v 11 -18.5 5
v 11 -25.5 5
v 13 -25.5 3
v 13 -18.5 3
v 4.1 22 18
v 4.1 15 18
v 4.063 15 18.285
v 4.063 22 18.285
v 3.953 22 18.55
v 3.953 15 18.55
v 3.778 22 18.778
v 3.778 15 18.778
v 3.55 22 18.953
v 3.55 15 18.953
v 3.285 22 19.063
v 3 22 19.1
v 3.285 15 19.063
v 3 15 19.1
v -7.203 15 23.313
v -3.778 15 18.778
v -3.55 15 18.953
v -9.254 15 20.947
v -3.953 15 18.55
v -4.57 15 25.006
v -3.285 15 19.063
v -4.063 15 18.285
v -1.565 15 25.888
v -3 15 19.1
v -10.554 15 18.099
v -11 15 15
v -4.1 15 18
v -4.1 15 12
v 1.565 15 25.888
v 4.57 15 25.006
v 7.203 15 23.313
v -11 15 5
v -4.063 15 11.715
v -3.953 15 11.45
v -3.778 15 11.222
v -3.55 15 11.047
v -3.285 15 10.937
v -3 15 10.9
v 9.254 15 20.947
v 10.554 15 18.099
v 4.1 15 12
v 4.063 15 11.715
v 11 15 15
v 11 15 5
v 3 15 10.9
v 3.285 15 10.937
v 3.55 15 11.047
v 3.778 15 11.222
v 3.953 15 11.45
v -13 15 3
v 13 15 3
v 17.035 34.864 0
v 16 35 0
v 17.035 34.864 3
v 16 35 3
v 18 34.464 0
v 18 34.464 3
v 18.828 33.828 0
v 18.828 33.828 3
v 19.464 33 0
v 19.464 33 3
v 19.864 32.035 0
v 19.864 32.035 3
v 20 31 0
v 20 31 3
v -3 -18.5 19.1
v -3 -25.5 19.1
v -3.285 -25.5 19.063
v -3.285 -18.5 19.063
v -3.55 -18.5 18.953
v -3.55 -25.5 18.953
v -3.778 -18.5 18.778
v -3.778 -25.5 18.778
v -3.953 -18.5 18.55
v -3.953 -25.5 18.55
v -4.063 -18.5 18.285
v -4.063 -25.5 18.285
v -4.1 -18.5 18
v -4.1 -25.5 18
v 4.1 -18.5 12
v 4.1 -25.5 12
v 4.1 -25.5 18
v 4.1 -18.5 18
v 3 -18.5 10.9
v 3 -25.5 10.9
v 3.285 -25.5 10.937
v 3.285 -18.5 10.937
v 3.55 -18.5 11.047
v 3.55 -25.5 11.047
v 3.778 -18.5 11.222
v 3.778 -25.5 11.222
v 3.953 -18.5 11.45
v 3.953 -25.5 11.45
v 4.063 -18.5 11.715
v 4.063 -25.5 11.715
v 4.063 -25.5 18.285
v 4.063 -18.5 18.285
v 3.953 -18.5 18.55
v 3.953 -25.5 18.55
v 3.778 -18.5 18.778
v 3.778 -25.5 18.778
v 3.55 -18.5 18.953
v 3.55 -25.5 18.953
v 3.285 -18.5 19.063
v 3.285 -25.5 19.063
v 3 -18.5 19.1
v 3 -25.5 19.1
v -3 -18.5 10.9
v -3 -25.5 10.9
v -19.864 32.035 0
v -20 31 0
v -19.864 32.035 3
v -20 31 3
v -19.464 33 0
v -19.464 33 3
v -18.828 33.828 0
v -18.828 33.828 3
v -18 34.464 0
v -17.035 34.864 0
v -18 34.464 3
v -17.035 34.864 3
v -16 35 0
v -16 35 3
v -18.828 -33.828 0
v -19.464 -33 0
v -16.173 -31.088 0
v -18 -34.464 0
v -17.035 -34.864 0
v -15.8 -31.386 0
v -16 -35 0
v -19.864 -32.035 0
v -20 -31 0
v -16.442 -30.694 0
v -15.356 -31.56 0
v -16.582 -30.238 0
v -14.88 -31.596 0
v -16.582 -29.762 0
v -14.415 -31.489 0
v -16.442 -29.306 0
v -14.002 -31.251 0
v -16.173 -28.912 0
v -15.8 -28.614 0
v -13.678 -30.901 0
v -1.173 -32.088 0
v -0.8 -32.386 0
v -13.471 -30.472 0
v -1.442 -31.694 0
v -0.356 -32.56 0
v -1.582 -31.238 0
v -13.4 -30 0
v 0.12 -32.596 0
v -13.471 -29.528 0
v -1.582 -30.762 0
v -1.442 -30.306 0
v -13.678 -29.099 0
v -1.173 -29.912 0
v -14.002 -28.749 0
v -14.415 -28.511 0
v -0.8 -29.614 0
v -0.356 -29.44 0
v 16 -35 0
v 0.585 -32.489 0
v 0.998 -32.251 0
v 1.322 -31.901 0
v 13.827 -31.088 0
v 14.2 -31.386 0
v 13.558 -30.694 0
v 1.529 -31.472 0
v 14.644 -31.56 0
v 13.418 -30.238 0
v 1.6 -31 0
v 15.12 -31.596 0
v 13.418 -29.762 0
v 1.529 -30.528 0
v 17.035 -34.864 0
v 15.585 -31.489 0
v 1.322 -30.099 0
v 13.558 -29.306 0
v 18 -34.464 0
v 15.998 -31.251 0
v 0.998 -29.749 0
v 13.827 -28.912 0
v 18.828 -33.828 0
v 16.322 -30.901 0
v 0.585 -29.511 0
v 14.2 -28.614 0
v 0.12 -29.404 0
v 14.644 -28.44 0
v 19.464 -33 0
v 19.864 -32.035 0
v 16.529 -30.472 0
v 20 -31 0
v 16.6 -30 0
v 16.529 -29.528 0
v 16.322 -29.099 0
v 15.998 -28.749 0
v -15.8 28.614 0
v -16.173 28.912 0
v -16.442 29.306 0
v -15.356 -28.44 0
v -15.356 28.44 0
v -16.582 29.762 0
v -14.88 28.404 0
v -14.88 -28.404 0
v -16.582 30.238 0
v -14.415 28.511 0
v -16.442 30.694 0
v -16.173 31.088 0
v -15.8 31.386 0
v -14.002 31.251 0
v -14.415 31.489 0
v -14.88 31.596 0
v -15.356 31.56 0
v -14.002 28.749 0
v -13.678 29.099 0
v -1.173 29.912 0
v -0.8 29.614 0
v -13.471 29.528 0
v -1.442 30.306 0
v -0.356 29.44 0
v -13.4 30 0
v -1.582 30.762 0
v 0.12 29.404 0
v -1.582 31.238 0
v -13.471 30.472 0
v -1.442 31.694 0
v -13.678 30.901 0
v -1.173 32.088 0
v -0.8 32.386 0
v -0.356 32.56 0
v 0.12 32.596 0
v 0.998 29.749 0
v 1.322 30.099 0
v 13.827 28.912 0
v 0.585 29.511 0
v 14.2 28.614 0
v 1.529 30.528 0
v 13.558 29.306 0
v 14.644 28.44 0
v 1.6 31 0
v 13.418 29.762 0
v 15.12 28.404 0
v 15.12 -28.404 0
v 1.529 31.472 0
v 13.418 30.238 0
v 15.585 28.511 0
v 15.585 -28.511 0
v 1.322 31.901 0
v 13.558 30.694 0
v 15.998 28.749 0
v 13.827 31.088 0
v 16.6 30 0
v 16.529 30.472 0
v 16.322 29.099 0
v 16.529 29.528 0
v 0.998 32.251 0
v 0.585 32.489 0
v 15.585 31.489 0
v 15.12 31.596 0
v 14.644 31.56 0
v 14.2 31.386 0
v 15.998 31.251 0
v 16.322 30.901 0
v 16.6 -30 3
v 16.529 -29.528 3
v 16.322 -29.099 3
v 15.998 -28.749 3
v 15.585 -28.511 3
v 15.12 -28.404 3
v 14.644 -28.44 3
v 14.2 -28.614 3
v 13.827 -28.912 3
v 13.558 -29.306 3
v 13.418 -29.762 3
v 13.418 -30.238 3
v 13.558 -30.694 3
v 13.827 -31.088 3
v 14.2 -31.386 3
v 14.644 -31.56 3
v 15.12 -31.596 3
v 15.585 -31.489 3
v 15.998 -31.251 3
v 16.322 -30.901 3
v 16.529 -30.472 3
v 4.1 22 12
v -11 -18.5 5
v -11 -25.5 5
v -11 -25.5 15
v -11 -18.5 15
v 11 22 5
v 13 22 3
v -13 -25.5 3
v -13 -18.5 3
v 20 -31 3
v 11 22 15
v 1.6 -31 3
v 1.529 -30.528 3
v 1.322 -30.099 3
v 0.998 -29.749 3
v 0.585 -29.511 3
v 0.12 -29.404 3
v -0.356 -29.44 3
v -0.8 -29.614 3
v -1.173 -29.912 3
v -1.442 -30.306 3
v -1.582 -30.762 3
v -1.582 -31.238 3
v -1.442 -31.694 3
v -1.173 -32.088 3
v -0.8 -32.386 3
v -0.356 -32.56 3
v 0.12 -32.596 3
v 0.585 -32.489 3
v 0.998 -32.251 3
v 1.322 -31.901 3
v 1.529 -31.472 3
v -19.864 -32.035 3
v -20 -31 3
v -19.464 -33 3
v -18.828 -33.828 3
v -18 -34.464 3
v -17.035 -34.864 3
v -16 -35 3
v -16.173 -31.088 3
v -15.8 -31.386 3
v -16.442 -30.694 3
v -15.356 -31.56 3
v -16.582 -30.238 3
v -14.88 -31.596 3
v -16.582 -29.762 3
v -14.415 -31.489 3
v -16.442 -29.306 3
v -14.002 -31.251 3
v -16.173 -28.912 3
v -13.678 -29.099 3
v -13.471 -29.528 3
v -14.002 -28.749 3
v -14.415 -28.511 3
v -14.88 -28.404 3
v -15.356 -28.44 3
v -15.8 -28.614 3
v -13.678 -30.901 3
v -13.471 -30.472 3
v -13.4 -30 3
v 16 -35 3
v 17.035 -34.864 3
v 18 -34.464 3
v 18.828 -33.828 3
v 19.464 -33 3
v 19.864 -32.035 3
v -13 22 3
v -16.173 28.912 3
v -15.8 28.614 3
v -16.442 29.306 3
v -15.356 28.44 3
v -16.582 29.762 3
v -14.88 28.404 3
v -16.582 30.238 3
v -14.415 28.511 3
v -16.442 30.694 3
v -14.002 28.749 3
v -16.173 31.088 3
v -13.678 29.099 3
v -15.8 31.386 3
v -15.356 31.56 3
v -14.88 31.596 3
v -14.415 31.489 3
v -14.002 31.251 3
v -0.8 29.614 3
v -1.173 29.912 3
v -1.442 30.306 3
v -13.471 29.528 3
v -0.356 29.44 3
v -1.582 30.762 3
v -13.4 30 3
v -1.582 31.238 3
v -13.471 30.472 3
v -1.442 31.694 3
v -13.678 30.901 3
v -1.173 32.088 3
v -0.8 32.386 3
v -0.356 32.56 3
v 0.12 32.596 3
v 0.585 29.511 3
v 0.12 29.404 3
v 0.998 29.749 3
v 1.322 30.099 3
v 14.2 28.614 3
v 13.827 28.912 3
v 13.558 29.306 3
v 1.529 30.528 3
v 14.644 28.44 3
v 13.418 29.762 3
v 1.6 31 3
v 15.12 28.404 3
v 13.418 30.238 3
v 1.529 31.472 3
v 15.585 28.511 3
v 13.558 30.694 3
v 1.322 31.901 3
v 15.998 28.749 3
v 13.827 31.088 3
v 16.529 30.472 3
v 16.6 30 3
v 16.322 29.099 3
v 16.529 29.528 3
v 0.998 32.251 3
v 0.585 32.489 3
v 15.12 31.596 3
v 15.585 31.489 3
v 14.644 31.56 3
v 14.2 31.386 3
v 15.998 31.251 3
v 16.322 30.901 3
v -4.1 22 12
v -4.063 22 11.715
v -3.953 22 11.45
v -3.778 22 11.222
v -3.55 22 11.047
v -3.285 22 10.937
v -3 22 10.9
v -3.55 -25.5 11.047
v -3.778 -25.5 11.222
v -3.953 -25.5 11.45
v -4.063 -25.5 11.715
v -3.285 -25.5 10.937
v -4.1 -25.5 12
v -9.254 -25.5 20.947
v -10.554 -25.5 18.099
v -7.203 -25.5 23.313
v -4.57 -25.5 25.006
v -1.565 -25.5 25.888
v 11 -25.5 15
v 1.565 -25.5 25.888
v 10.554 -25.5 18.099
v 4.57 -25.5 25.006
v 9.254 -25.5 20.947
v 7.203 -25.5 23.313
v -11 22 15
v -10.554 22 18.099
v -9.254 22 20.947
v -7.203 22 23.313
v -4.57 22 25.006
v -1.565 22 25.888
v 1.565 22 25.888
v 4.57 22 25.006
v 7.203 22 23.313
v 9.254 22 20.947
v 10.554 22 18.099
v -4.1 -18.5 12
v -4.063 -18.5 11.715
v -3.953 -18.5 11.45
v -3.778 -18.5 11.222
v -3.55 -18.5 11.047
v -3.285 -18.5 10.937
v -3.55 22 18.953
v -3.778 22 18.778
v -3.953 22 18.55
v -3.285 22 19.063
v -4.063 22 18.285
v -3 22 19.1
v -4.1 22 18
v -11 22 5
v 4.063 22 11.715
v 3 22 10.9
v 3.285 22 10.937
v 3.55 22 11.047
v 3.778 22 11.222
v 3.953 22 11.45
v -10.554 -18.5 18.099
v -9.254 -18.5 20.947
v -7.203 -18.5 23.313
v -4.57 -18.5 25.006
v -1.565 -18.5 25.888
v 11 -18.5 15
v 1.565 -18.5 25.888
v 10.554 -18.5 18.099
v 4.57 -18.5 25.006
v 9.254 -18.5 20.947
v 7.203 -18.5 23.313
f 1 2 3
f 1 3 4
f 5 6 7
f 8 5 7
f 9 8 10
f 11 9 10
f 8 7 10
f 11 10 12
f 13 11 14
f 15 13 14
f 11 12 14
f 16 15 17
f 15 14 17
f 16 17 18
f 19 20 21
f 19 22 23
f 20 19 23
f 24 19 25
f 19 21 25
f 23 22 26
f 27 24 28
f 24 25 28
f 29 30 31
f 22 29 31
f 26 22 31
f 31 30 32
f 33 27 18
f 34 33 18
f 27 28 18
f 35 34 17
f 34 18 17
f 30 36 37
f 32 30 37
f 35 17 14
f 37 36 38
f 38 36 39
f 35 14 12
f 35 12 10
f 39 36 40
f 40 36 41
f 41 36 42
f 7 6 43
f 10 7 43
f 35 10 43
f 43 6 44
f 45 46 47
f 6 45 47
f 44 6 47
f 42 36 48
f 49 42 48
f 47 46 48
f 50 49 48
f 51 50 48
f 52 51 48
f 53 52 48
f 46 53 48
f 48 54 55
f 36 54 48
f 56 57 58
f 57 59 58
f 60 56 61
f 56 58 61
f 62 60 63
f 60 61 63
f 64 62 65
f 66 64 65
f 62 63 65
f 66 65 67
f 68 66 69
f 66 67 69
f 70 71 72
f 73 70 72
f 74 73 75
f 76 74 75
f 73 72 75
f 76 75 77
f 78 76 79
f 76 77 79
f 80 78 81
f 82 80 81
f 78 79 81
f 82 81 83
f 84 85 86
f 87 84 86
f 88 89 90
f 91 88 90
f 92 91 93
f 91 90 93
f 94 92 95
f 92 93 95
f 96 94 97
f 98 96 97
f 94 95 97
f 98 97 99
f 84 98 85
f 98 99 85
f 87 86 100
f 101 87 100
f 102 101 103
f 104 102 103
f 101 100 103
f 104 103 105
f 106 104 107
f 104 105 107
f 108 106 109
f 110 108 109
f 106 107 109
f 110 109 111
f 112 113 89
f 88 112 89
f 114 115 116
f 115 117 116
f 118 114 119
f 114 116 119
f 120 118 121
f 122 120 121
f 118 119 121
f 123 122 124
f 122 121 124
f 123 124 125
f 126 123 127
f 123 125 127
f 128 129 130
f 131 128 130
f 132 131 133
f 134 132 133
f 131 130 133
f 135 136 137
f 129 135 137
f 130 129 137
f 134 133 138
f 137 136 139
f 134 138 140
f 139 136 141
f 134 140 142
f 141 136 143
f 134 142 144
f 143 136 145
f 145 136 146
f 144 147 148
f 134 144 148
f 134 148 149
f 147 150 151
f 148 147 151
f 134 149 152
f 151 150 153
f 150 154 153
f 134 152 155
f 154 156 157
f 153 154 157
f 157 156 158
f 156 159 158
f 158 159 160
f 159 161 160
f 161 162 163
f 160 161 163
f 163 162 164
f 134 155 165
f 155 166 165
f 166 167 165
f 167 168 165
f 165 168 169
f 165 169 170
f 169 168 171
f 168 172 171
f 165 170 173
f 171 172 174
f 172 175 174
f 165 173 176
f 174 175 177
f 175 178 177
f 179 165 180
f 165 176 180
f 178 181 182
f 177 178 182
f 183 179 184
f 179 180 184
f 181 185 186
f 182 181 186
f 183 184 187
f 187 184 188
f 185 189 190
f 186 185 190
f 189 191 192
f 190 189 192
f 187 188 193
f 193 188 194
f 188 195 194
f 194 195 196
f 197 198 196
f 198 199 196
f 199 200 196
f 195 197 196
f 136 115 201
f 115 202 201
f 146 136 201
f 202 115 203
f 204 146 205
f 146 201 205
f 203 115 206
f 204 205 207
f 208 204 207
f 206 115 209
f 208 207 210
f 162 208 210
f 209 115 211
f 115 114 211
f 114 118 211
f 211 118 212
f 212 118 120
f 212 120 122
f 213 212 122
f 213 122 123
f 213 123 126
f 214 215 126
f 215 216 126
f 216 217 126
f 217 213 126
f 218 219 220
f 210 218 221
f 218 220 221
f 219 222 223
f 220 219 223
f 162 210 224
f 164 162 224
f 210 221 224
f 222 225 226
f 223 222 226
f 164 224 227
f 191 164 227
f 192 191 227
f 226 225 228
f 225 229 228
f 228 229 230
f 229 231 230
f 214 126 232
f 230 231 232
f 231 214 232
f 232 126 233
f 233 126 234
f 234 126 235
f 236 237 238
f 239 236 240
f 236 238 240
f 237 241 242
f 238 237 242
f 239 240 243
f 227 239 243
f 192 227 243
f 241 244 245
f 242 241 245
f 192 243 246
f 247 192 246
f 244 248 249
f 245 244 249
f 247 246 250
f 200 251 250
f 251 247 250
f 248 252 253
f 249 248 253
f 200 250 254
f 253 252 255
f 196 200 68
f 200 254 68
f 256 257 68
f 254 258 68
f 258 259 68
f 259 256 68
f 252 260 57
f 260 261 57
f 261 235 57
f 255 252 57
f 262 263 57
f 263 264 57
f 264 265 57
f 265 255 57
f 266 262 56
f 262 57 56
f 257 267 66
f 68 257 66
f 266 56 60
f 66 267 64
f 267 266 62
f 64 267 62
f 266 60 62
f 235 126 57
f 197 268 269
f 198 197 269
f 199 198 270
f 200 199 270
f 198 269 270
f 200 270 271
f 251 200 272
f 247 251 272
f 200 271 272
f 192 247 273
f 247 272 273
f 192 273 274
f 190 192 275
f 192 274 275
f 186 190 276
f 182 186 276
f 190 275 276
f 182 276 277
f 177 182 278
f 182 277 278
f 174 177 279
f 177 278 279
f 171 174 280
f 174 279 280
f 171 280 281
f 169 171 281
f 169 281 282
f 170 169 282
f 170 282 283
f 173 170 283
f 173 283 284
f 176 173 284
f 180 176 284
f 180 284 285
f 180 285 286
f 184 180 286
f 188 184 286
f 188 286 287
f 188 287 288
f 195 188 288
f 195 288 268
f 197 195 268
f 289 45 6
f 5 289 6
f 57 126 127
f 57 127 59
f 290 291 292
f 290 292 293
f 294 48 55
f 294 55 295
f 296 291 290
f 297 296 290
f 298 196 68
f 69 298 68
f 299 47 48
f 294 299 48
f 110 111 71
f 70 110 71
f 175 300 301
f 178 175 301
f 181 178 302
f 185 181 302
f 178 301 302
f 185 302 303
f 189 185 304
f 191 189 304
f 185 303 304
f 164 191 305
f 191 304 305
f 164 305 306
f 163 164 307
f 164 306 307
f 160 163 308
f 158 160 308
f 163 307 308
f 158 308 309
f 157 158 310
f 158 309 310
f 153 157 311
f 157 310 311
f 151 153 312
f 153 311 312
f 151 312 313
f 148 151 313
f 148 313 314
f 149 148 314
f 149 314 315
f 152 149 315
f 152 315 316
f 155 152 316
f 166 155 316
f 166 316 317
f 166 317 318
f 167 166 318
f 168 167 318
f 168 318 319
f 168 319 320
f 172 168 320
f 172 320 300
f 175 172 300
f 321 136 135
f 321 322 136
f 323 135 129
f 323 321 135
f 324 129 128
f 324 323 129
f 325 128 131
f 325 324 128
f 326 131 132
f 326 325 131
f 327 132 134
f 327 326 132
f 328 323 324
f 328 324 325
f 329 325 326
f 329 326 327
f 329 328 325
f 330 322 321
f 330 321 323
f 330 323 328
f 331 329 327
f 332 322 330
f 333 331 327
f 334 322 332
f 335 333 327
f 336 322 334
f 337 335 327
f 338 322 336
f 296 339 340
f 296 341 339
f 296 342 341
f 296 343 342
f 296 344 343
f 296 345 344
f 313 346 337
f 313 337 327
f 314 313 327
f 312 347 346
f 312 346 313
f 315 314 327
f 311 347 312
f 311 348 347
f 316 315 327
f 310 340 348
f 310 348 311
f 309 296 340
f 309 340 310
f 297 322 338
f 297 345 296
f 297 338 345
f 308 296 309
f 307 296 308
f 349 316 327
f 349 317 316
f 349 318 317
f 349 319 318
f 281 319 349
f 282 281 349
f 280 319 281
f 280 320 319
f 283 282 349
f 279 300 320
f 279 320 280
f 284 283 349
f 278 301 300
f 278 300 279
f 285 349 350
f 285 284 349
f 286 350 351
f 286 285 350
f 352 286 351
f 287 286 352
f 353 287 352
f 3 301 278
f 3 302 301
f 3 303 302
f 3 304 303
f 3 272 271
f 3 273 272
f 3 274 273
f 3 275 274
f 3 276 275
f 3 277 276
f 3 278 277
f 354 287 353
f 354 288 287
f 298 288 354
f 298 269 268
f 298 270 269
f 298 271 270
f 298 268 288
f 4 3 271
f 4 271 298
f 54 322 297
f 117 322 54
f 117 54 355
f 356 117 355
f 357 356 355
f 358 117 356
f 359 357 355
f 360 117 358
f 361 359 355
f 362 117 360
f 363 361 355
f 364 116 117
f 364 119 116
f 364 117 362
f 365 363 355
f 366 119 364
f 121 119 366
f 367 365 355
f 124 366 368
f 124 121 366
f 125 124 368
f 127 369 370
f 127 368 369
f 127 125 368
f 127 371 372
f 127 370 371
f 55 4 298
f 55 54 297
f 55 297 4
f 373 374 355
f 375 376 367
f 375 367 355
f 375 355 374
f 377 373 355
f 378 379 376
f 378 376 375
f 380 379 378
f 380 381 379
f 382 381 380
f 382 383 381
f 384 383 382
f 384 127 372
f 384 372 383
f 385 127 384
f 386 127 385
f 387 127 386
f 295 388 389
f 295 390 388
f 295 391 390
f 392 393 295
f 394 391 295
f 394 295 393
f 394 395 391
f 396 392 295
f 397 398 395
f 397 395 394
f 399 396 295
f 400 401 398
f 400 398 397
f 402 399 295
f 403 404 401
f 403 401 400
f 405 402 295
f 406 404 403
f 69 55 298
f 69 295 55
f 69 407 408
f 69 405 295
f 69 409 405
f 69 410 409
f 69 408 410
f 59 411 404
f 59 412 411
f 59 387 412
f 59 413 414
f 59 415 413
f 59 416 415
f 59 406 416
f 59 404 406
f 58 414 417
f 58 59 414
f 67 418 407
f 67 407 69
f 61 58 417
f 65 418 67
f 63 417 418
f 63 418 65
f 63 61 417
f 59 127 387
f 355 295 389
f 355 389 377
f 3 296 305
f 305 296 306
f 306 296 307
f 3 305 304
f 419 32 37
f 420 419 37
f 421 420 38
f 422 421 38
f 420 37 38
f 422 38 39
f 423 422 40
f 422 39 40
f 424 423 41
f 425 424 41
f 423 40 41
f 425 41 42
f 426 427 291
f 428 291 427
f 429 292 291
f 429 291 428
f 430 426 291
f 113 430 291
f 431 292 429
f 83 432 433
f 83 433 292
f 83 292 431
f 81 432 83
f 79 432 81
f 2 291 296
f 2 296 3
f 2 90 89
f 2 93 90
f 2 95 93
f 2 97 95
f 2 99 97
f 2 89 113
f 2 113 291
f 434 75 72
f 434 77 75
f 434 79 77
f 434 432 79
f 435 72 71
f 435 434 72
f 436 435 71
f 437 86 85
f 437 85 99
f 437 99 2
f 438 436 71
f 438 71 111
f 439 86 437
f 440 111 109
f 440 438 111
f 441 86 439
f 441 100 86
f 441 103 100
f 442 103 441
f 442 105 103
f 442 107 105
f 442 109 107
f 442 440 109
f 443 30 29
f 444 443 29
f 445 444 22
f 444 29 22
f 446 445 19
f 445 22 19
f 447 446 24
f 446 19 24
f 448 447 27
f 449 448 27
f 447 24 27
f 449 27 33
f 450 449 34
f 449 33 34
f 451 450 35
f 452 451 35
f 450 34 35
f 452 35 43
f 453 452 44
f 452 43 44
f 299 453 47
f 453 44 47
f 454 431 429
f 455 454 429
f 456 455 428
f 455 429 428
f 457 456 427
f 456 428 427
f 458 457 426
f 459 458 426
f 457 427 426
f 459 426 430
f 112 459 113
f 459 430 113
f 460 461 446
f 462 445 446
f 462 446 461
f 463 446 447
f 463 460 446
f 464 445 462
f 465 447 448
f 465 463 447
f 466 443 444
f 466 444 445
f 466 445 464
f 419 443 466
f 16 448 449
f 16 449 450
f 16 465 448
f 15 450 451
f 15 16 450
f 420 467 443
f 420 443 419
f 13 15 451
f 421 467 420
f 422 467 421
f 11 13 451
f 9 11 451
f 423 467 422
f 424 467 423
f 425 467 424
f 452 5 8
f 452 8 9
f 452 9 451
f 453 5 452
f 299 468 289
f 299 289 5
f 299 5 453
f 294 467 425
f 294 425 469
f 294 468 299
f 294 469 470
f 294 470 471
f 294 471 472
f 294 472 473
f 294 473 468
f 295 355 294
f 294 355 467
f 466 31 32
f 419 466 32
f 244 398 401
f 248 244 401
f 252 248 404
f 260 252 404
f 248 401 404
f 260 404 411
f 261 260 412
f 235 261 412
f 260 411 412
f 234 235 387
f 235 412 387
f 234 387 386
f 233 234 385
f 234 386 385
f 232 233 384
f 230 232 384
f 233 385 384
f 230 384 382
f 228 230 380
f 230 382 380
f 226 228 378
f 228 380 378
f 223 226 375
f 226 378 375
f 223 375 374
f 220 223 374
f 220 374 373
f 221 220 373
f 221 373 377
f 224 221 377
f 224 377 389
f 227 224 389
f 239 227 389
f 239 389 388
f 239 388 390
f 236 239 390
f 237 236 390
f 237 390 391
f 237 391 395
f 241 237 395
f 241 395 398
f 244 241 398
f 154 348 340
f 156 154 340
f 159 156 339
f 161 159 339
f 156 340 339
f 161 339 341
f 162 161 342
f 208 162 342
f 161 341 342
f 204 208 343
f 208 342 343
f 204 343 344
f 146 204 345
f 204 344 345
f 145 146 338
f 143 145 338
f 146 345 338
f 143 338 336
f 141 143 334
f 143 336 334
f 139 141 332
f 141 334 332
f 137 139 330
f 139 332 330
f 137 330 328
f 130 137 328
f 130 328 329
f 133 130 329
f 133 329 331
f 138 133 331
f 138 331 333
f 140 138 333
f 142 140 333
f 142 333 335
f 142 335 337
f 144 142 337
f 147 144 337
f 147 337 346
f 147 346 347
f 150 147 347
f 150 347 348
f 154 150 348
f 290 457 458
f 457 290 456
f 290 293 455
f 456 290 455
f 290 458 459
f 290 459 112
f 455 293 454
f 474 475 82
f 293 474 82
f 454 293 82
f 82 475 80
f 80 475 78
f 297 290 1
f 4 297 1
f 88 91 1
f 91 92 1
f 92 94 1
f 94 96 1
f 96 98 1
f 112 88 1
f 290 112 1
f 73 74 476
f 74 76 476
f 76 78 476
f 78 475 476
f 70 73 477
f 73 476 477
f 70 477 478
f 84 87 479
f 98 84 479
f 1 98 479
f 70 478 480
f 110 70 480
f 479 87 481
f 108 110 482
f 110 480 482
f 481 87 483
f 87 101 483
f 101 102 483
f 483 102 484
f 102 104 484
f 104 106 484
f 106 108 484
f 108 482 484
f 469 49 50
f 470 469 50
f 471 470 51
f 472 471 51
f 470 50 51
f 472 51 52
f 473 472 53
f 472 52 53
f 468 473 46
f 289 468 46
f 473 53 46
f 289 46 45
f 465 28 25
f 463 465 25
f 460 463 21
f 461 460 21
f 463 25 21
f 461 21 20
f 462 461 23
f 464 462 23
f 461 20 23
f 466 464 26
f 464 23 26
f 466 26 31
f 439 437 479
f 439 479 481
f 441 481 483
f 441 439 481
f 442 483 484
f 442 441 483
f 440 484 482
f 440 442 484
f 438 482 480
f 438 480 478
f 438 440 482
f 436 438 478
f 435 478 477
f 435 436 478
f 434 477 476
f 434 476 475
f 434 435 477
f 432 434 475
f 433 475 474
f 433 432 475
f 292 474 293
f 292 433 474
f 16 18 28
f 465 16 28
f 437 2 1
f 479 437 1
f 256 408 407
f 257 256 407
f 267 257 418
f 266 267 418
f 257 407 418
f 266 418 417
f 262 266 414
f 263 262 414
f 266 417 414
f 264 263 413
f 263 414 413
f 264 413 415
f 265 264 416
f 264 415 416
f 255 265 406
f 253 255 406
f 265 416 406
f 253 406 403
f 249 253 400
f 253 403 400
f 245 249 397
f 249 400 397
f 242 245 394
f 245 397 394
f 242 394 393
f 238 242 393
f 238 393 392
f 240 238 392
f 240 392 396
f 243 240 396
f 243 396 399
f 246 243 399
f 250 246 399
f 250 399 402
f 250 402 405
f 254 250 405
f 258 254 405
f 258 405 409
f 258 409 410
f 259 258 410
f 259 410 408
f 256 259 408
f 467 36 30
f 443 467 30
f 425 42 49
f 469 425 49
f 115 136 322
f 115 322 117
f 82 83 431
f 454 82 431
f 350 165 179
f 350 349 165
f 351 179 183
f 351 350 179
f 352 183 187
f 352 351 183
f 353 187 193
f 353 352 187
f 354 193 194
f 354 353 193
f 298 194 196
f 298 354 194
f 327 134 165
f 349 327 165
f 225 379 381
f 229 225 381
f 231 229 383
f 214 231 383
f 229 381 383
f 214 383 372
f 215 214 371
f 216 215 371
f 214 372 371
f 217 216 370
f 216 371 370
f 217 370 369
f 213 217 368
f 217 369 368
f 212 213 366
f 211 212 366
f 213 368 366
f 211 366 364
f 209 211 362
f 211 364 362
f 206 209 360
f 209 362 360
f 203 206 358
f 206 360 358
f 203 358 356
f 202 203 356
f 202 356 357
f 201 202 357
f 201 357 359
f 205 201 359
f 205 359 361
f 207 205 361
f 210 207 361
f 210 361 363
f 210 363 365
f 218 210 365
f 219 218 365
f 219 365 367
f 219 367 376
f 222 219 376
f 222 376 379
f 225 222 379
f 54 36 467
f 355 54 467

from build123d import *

# Parameters (mm, degrees)
SKETCH_1_W          = 40
SKETCH_1_H          = 70
EXTRUDE_1_DEPTH     = 3
SKETCH_2_W          = 22
SKETCH_2_H          = 61
EXTRUDE_2_DEPTH     = 3
SKETCH_3_W          = 22
SKETCH_3_H          = 7
EXTRUDE_3_DEPTH     = 12
SKETCH_4_R          = 11
EXTRUDE_4_DEPTH     = 7
SKETCH_7_R          = 1.6
CUT_EXTRUDE_2_DEPTH = 7
SKETCH_8_R          = 1.6
CUT_EXTRUDE_3_DEPTH = 7
FILLET_1_R          = 4
EXTRUDE_START       = -7
EXTRUDE_5_DEPTH     = 7
CUT_EXTRUDE_4_DEPTH = 66.76473219
CHAMFER_1_SIZE      = 2
CUT_EXTRUDE_5_DEPTH = 69.820418482


with BuildPart() as part:
    # 草图1 → 凸台-拉伸1 (new body)
    with BuildSketch(Plane.XY):
        Rectangle(SKETCH_1_W, SKETCH_1_H)
    extrude(amount=EXTRUDE_1_DEPTH)

    # 草图2 → 凸台-拉伸2 (add)
    with BuildSketch(Plane.XY.offset(3)):
        Rectangle(SKETCH_2_W, SKETCH_2_H)
    extrude(amount=-EXTRUDE_2_DEPTH)

    # 草图3 → 凸台-拉伸3 (add)
    with BuildSketch(Plane.XY.offset(3)):
        with Locations((0, -22)):
            Rectangle(SKETCH_3_W, SKETCH_3_H)
    extrude(amount=EXTRUDE_3_DEPTH)

    # 草图4 → 凸台-拉伸4 (add)
    with BuildSketch(Plane.XZ.offset(25.5)):
        with Locations((0, 15)):
            Circle(SKETCH_4_R)
    extrude(amount=-EXTRUDE_4_DEPTH)

    # 草图7 → 切除-拉伸2 (cut)
    with BuildSketch(Plane.XY.offset(3)):
        with Locations((-15, 30)):
            Circle(SKETCH_7_R)
        with Locations((15, 30)):
            Circle(SKETCH_7_R)
        with Locations((15, -30)):
            Circle(SKETCH_7_R)
        with Locations((-15, -30)):
            Circle(SKETCH_7_R)
    extrude(amount=-CUT_EXTRUDE_2_DEPTH, mode=Mode.SUBTRACT)

    # 草图8 → 切除-拉伸3 (cut)
    with BuildSketch(Plane.XY.offset(3)):
        with Locations((0, 31)):
            Circle(SKETCH_8_R)
        with Locations((0, -31)):
            Circle(SKETCH_8_R)
    extrude(amount=-CUT_EXTRUDE_3_DEPTH, mode=Mode.SUBTRACT)

    # 圆角1
    fillet_1_edges = [part.edges().sort_by_distance(p)[0] for p in [
        (20, -35, 1.5),
        (-20, -35, 1.5),
        (-20, 35, 1.5),
        (20, 35, 1.5),
    ]]
    fillet(fillet_1_edges, radius=FILLET_1_R)

    # 草图9 → 凸台-拉伸5 (add)
    with BuildSketch(Plane(origin=(0, 22, 0), x_dir=(1, 0, 0), z_dir=(0, 1, 0)).offset(EXTRUDE_START)):
        with BuildLine():
            Line((-11, -3), (-11, -15))
            ThreePointArc((-11, -15), (0, -26), (11, -15))
            Line((11, -15), (11, -3))
            Line((11, -3), (-11, -3))
        make_face()
    extrude(amount=EXTRUDE_5_DEPTH)

    # 草图10 → 切除-拉伸4 (cut, through all)
    with BuildSketch(Plane(origin=(0, 22, 0), x_dir=(1, 0, 0), z_dir=(0, 1, 0))):
        with BuildLine():
            Line((-3, -19), (3, -19))
            ThreePointArc((3, -19), (3.707106781, -18.707106781), (4, -18))
            Line((4, -18), (4, -12))
            ThreePointArc((4, -12), (3.707106781, -11.292893219), (3, -11))
            Line((3, -11), (-3, -11))
            ThreePointArc((-3, -11), (-3.707106781, -11.292893219), (-4, -12))
            Line((-4, -12), (-4, -18))
            ThreePointArc((-4, -18), (-3.707106781, -18.707106781), (-3, -19))
        make_face()
    extrude(amount=-CUT_EXTRUDE_4_DEPTH, mode=Mode.SUBTRACT)

    # 倒角1
    chamfer_1_edges = [part.edges().sort_by_distance(p)[0] for p in [
        (-11, 18.5, 3),
        (11, 18.5, 3),
        (11, -22, 3),
        (-11, -22, 3),
    ]]
    chamfer(chamfer_1_edges, length=CHAMFER_1_SIZE)

    # 草图11 → 切除-拉伸5 (cut, through all)
    with BuildSketch(Plane.XZ.offset(25.5)):
        with BuildLine():
            Line((-4.1, 18), (-4.1, 12))
            ThreePointArc((-4.1, 12), (-3.777817459, 11.222182541), (-3, 10.9))
            Line((-3, 10.9), (3, 10.9))
            ThreePointArc((3, 10.9), (3.777817459, 11.222182541), (4.1, 12))
            Line((4.1, 12), (4.1, 18))
            ThreePointArc((4.1, 18), (3.777817459, 18.777817459), (3, 19.1))
            Line((3, 19.1), (-3, 19.1))
            ThreePointArc((-3, 19.1), (-3.777817459, 18.777817459), (-4.1, 18))
        make_face()
    extrude(amount=-CUT_EXTRUDE_5_DEPTH, mode=Mode.SUBTRACT)


solid = part.part
